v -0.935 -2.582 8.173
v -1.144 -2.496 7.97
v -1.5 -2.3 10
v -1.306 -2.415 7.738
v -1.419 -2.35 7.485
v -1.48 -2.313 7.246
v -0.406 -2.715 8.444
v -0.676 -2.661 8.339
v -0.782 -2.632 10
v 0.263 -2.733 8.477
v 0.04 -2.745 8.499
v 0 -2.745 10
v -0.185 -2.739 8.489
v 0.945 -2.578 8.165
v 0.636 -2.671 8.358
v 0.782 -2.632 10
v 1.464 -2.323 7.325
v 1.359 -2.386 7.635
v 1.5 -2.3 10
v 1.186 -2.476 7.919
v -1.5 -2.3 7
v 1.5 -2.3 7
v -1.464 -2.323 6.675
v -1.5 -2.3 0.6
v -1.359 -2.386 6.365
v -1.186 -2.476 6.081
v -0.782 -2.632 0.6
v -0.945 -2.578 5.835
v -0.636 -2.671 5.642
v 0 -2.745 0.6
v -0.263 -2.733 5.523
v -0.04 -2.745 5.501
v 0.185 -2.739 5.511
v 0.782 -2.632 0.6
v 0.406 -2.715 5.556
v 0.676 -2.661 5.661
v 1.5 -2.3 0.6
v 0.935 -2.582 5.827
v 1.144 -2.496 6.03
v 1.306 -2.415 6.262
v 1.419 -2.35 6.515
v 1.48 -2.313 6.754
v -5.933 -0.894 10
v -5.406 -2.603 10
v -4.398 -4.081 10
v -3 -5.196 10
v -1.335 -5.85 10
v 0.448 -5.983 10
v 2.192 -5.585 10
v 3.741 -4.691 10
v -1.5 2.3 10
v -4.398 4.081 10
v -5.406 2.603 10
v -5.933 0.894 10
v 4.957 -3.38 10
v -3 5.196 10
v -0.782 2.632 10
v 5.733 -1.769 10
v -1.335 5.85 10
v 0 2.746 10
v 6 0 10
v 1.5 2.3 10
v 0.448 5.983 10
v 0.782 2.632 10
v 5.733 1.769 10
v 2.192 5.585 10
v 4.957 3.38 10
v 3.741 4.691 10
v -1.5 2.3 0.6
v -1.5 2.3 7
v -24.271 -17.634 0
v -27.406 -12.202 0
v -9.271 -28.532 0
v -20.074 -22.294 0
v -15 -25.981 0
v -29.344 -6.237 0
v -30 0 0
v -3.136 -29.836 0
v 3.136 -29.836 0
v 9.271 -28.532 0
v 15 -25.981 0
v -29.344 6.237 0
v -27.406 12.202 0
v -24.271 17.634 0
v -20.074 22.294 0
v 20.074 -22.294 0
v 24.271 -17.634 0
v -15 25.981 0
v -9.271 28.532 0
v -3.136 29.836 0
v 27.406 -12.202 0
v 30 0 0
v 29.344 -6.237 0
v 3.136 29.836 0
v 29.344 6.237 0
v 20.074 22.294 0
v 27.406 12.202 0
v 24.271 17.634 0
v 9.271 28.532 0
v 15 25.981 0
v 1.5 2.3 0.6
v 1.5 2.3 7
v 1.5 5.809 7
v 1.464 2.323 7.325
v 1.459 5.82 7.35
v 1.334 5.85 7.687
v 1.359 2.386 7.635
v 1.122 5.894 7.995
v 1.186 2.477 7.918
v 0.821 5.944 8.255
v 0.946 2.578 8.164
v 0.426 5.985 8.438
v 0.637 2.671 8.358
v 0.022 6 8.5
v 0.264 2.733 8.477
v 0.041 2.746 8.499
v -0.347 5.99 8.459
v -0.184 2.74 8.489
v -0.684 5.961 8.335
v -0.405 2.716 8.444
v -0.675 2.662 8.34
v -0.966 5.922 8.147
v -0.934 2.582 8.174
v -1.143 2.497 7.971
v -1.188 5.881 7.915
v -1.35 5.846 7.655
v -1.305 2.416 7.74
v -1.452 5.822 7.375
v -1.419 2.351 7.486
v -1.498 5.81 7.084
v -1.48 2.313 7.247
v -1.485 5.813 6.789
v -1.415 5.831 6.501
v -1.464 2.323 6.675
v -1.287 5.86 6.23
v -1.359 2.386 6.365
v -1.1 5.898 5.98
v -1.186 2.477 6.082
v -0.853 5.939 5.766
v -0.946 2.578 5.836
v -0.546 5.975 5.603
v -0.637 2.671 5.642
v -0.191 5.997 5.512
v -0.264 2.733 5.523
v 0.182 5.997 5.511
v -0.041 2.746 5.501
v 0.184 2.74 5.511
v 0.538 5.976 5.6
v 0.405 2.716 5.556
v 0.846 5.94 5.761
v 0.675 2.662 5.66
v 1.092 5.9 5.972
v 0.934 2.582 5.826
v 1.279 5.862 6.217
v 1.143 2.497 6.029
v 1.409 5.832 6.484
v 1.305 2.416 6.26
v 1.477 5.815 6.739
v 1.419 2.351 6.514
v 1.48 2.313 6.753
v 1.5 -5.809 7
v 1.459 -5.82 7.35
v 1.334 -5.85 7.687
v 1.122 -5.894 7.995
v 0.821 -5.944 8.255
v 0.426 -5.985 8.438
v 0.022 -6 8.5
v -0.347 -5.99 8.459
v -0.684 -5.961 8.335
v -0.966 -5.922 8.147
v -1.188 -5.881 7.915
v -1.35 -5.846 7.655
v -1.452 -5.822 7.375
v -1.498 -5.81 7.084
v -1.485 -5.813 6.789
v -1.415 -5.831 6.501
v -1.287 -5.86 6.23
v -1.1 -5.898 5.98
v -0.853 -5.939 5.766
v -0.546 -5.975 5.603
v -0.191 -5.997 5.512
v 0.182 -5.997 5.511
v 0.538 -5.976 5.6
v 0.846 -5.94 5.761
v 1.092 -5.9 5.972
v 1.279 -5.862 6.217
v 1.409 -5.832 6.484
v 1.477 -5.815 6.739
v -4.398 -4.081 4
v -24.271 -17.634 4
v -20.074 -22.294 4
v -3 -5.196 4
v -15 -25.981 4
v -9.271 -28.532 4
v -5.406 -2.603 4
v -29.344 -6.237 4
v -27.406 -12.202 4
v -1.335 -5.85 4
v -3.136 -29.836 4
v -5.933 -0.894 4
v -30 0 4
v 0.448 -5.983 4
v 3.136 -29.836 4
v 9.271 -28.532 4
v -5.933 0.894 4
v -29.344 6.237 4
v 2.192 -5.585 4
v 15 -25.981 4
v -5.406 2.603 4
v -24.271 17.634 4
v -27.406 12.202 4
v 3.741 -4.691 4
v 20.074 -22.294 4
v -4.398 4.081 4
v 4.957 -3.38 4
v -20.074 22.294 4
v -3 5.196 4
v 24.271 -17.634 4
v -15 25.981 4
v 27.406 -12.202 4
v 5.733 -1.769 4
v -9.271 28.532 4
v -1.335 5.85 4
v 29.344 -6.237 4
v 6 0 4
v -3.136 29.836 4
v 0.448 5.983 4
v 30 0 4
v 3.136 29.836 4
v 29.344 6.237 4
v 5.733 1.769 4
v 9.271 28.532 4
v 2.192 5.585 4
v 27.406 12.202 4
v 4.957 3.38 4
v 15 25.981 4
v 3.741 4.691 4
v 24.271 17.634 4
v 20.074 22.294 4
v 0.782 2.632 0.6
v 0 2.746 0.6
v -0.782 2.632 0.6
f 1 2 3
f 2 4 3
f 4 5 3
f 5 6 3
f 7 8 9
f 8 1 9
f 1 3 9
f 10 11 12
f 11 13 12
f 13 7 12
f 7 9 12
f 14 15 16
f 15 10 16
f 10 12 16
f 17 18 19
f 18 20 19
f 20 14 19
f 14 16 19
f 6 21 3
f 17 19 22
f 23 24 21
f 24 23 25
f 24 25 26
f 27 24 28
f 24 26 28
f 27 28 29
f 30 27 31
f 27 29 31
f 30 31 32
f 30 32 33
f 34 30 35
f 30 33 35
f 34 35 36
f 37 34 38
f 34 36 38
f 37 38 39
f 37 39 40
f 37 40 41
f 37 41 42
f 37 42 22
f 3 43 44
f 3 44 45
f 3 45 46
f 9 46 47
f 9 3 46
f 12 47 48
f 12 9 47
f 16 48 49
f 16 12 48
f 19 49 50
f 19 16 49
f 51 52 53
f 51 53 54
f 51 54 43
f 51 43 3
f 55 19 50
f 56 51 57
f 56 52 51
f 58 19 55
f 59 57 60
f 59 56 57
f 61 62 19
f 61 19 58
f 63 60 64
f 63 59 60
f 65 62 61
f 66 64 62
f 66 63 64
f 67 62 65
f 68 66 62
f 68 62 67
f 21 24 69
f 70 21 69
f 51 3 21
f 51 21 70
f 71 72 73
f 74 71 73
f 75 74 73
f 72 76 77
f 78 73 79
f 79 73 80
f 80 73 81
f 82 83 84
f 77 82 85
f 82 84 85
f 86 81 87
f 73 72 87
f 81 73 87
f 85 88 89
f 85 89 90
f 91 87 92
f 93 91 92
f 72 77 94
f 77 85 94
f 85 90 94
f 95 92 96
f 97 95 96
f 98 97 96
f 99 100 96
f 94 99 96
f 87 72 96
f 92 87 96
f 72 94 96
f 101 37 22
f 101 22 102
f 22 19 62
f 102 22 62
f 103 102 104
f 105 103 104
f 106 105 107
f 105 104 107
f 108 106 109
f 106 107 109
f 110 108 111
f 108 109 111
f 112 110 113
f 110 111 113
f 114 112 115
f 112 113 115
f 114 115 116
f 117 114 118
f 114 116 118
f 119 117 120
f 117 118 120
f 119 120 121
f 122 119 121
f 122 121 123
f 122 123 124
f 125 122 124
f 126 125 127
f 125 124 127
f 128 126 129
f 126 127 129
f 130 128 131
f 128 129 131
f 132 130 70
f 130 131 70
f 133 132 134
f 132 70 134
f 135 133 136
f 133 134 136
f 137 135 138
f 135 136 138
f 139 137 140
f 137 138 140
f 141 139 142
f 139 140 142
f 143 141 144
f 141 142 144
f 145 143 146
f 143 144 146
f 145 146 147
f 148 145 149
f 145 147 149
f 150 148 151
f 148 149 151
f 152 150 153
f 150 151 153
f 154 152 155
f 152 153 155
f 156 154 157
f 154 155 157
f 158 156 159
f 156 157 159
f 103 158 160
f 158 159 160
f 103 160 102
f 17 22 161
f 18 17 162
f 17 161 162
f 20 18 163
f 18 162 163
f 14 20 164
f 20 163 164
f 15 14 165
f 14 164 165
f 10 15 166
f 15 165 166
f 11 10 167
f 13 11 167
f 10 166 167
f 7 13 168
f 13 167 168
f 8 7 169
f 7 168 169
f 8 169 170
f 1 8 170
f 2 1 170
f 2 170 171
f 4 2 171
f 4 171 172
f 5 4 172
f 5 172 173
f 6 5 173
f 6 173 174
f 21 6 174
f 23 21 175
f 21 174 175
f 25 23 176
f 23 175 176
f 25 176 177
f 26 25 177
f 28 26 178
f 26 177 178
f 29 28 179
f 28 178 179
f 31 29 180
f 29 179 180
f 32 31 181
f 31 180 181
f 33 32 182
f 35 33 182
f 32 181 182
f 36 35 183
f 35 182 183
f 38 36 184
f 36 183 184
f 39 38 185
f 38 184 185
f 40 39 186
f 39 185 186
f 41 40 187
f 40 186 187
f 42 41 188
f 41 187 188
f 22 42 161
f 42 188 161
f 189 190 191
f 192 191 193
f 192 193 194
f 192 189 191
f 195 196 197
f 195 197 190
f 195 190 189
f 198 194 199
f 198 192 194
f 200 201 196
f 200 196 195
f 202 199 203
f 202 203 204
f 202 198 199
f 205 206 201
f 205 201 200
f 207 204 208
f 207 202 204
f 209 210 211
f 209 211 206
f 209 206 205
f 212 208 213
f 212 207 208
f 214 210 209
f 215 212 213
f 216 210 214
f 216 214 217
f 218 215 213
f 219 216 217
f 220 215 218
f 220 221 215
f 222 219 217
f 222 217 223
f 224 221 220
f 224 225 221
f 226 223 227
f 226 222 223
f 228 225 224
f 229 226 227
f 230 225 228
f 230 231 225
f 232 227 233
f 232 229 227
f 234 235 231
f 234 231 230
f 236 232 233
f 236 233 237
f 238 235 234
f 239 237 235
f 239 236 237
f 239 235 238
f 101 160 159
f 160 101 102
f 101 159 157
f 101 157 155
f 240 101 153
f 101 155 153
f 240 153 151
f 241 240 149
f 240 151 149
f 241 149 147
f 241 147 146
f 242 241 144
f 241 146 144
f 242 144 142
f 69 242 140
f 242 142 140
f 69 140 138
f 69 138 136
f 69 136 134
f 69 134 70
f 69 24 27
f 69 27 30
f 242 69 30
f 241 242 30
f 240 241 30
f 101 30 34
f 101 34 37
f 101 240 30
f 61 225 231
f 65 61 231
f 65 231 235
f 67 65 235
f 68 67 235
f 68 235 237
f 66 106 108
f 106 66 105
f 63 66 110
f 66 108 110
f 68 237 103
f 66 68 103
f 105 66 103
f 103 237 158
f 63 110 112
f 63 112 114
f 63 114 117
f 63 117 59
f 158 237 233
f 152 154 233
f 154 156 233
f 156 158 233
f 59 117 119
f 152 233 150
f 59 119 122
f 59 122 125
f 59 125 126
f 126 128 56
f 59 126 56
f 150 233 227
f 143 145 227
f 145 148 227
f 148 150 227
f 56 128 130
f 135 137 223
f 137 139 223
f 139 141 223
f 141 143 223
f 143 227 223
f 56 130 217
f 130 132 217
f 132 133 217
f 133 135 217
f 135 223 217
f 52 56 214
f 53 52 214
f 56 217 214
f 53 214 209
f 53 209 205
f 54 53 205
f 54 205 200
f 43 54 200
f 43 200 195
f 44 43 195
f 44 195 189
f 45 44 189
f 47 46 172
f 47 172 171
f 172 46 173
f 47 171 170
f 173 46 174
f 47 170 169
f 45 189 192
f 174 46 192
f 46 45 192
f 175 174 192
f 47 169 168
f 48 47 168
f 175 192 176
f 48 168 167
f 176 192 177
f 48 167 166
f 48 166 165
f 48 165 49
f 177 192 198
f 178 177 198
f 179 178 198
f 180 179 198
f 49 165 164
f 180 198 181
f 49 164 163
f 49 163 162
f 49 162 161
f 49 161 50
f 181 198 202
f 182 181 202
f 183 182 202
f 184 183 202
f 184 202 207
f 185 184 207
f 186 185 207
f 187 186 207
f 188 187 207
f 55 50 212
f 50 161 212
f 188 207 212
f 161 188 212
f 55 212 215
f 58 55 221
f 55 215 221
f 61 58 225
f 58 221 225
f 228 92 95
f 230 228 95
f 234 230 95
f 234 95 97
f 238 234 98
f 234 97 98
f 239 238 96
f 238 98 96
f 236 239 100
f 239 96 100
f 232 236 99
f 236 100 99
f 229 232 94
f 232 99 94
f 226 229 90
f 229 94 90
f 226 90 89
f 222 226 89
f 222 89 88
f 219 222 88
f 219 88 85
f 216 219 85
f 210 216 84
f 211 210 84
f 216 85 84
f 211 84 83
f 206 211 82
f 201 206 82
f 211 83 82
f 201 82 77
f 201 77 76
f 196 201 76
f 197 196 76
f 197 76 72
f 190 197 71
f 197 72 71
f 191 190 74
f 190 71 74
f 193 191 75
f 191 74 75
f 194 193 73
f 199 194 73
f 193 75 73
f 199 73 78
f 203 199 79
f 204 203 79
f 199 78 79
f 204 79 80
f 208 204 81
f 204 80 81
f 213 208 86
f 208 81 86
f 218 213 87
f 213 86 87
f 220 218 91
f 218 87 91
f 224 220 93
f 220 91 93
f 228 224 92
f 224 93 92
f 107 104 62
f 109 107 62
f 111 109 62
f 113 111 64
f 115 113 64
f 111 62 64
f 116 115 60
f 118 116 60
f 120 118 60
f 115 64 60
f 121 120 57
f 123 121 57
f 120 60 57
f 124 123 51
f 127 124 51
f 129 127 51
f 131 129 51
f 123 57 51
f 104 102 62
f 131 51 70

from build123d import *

# Parameters (mm, degrees)
F0_R     = 30
F1_DEPTH = 4
F2_R     = 6
F3_DEPTH = 6
F4_R     = 1.5
F5_DEPTH = 12.5
F6_W     = 3
F6_H     = 4.6
F7_DEPTH = 9.4


with BuildPart() as f1:
    # F0 (on Top) → F1 (new body)
    with BuildSketch(Plane.XY):
        Circle(F0_R)
    extrude(amount=F1_DEPTH)

    # F2 (on face) → F3 (join)
    with BuildSketch(Plane.XY.offset(4)):
        Circle(F2_R)
    extrude(amount=F3_DEPTH)

    # F4 (on Front) → F5 (cut, symmetric)
    with BuildSketch(Plane.XZ):
        with Locations((0, 7)):
            Circle(F4_R)
    extrude(amount=F5_DEPTH, both=True, mode=Mode.SUBTRACT)

    # F6 (on face) → F7 (cut)
    with BuildSketch(Plane.XY.offset(10)):
        with BuildLine():
            ThreePointArc((-1.5, -2.3), (0, -2.745184), (1.5, -2.3))
            Line((1.5, -2.3), (-1.5, -2.3))
        make_face()
        Rectangle(F6_W, F6_H)
        with BuildLine():
            Line((-1.5, 2.3), (1.5, 2.3))
            ThreePointArc((1.5, 2.3), (0, 2.745906), (-1.5, 2.3))
        make_face()
    extrude(amount=-F7_DEPTH, mode=Mode.SUBTRACT)


solid = f1.part
